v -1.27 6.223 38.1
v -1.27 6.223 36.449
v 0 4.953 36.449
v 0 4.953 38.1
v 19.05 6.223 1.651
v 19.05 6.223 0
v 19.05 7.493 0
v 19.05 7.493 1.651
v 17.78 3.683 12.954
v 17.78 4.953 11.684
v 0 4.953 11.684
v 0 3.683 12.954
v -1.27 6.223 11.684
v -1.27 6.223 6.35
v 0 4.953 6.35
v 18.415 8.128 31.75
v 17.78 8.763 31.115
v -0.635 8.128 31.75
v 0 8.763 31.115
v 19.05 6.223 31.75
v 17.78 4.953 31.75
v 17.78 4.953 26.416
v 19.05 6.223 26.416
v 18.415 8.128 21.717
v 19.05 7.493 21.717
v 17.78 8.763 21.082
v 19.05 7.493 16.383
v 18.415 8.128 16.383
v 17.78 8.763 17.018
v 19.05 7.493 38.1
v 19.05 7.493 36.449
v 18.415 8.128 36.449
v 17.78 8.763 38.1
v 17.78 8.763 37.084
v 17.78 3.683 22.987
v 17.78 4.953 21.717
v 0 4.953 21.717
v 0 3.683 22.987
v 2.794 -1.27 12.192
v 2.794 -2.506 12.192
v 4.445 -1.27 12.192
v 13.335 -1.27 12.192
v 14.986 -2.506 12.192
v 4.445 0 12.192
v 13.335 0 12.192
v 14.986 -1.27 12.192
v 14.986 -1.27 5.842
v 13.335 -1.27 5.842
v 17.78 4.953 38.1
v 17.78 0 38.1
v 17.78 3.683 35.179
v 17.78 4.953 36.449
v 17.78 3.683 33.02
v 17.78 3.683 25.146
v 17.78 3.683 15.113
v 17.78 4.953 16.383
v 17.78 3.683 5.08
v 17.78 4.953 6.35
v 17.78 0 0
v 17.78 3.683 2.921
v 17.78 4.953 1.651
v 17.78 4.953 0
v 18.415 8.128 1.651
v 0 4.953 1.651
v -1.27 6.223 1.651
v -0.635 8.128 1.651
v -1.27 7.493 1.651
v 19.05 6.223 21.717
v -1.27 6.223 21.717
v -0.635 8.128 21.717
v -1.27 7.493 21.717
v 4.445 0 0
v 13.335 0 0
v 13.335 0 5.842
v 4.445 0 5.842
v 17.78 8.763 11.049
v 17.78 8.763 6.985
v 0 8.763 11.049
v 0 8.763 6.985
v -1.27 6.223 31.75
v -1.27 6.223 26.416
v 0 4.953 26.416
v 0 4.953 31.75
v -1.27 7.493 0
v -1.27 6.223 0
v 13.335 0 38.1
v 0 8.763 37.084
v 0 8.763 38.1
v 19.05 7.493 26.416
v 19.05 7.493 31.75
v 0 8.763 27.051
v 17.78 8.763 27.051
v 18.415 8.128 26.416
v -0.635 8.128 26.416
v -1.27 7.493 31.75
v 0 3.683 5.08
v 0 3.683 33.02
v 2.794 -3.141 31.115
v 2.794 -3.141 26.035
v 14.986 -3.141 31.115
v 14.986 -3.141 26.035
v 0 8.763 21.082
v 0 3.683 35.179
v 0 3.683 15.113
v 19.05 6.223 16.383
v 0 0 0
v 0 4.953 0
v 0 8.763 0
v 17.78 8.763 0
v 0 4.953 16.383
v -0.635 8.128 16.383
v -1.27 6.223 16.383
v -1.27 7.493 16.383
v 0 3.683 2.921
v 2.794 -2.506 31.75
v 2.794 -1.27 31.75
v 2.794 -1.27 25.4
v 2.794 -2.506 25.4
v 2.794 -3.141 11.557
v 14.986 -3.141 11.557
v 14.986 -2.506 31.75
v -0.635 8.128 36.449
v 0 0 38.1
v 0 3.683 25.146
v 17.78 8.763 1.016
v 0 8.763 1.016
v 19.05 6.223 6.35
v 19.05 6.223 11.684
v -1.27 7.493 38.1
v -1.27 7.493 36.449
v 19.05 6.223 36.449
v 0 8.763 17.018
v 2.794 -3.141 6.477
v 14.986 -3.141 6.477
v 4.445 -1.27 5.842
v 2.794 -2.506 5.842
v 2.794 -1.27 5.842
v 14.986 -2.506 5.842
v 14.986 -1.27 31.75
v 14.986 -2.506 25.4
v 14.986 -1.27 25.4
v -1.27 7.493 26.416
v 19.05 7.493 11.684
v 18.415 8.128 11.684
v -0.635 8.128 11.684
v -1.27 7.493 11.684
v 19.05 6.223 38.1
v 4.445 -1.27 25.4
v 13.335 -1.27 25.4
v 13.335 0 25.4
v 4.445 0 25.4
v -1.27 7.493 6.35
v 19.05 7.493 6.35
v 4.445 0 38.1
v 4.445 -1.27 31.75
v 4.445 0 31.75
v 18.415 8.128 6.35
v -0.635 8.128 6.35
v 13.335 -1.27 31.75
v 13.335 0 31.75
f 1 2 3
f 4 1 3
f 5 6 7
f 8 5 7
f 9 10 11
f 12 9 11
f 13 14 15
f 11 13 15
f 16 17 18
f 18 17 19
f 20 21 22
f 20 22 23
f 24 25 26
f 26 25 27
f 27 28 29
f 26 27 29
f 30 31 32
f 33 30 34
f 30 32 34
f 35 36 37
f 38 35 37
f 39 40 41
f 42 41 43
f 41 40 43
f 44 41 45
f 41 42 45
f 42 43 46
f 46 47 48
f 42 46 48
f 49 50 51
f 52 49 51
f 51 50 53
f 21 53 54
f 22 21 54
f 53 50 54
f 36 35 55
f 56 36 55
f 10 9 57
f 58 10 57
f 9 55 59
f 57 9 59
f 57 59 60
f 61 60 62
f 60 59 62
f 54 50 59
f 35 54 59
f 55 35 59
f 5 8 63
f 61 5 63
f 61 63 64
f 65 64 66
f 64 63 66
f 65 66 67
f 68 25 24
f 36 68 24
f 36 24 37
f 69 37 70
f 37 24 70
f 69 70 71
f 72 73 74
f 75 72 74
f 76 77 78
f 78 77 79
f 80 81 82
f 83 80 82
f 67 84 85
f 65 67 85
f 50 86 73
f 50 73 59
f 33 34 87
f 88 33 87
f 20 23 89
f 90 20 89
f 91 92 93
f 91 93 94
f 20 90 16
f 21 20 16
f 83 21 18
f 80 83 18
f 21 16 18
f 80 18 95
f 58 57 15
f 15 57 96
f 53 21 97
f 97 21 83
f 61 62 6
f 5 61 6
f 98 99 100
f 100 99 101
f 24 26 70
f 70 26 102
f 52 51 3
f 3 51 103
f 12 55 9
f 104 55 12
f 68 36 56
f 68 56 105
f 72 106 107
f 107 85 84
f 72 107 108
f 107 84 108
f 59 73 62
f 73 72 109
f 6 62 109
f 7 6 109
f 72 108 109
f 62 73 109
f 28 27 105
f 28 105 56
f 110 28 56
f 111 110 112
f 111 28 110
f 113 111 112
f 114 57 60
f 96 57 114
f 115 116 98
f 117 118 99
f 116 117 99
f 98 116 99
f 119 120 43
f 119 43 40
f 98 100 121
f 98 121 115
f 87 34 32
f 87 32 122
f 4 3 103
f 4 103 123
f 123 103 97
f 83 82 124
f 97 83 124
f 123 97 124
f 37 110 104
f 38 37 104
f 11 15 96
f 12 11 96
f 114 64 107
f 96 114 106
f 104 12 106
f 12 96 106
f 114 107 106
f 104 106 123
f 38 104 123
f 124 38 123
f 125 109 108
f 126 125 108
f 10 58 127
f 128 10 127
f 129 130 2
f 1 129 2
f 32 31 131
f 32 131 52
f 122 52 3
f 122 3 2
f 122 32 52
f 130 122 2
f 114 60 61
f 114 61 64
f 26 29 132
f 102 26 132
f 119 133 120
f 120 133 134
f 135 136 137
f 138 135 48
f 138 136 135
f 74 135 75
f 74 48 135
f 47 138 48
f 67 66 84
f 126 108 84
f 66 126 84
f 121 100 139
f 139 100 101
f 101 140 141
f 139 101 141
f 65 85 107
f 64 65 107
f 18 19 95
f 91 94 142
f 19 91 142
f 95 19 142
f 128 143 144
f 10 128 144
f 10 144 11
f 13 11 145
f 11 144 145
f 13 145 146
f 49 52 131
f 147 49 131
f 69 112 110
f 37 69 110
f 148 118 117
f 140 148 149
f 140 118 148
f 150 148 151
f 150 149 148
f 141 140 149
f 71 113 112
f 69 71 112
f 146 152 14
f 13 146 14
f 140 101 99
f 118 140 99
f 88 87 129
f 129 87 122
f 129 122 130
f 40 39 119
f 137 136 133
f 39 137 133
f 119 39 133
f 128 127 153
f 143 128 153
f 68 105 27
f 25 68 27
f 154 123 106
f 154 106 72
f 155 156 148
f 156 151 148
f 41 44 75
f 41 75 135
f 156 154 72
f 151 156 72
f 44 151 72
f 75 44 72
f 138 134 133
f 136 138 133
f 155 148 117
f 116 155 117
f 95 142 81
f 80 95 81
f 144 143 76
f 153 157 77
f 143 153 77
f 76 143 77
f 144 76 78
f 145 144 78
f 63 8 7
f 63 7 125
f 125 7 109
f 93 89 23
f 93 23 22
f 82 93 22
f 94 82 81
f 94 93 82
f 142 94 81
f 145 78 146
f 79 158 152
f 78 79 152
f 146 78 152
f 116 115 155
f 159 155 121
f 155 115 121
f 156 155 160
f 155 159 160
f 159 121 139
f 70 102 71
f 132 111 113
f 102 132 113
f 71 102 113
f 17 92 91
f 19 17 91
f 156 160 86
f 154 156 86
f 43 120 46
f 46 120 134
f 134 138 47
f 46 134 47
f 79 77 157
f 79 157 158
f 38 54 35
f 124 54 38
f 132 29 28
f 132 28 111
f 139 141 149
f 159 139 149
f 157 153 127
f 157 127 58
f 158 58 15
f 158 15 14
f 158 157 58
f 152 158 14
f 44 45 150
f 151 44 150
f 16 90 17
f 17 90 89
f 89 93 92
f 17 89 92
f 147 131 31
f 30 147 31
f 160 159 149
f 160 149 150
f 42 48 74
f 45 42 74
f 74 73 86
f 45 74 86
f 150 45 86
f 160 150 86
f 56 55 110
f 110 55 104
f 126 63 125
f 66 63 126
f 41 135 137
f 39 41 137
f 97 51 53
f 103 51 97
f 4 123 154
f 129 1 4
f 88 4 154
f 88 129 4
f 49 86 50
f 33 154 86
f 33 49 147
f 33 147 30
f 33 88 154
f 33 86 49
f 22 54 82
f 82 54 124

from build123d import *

# Parameters (mm, degrees)
F1_DEPTH = 38.1
F2_W     = 20.32
F2_H     = 4.699
F3_DEPTH = 5.08
F4_SIZE  = 1.27
F5_SIZE  = 0.635
F6_W     = 3.140959
F6_H     = 6.35
F6_H_2   = 13.208
F6_H_3   = 5.842
F7_DEPTH = 19.051
F8_SIZE  = 0.635


with BuildPart() as f1:
    # F0 (on Top) → F1 (new body)
    with BuildSketch(Plane.XY):
        Polygon((-1.27, 6.223), (0, 4.953), (17.78, 4.953), (19.05, 6.223), (19.05, 7.493), (17.78, 8.763), (8.89, 8.763), (0, 8.763), (-1.27, 7.493), align=None)
        Polygon((17.78, 4.953), (0, 4.953), (0, 0), (4.445, 0), (4.445, -1.27), (2.794, -1.27), (2.794, -3.140959), (8.89, -3.140959), (14.986, -3.140959), (14.986, -1.27), (13.335, -1.27), (13.335, 0), (17.78, 0), align=None)
    extrude(amount=F1_DEPTH)

    # F2 (on face) → F3 (cut)
    with BuildSketch(Plane(origin=(0, 8.763, 0), x_dir=(-1, 0, 0), z_dir=(0, 1, 0))):
        with Locations((-8.89, 34.0995)):
            Rectangle(F2_W, F2_H)
        with Locations((-8.89, 24.0665)):
            Rectangle(F2_W, F2_H)
        with Locations((-8.89, 14.0335)):
            Rectangle(F2_W, F2_H)
        with Locations((-8.89, 4.0005)):
            Rectangle(F2_W, F2_H)
    extrude(amount=-F3_DEPTH, mode=Mode.SUBTRACT)

    # F4
    f4_edges = [f1.edges().sort_by_distance(p)[0] for p in [
        (8.89, 3.683, 36.449),
        (8.89, 3.683, 31.75),
        (8.89, 3.683, 26.416),
        (8.89, 3.683, 21.717),
        (8.89, 3.683, 16.383),
        (8.89, 3.683, 11.684),
        (8.89, 3.683, 6.35),
        (8.89, 3.683, 1.651),
    ]]
    chamfer(f4_edges, length=F4_SIZE)

    # F5
    f5_edges = [f1.edges().sort_by_distance(p)[0] for p in [
        (8.89, 8.763, 31.75),
        (8.89, 8.763, 26.416),
        (8.89, 8.763, 21.717),
        (8.89, 8.763, 16.383),
        (8.89, 8.763, 11.684),
        (8.89, 8.763, 6.35),
        (8.89, 8.763, 1.651),
        (8.89, 8.763, 36.449),
    ]]
    chamfer(f5_edges, length=F5_SIZE)

    # F6 (on face) → F7 (cut, through all)
    with BuildSketch(Plane.YZ.offset(17.78)):
        with Locations((-1.57048, 34.925)):
            Rectangle(F6_W, F6_H)
        with Locations((-1.57048, 18.796)):
            Rectangle(F6_W, F6_H_2)
        with Locations((-1.57048, 2.921)):
            Rectangle(F6_W, F6_H_3)
    extrude(amount=-F7_DEPTH, mode=Mode.SUBTRACT)

    # F8
    f8_edges = [f1.edges().sort_by_distance(p)[0] for p in [
        (8.89, -3.140959, 31.75),
        (8.89, -3.140959, 12.192),
        (8.89, -3.140959, 25.4),
        (8.89, -3.140959, 5.842),
    ]]
    chamfer(f8_edges, length=F8_SIZE)


solid = f1.part
